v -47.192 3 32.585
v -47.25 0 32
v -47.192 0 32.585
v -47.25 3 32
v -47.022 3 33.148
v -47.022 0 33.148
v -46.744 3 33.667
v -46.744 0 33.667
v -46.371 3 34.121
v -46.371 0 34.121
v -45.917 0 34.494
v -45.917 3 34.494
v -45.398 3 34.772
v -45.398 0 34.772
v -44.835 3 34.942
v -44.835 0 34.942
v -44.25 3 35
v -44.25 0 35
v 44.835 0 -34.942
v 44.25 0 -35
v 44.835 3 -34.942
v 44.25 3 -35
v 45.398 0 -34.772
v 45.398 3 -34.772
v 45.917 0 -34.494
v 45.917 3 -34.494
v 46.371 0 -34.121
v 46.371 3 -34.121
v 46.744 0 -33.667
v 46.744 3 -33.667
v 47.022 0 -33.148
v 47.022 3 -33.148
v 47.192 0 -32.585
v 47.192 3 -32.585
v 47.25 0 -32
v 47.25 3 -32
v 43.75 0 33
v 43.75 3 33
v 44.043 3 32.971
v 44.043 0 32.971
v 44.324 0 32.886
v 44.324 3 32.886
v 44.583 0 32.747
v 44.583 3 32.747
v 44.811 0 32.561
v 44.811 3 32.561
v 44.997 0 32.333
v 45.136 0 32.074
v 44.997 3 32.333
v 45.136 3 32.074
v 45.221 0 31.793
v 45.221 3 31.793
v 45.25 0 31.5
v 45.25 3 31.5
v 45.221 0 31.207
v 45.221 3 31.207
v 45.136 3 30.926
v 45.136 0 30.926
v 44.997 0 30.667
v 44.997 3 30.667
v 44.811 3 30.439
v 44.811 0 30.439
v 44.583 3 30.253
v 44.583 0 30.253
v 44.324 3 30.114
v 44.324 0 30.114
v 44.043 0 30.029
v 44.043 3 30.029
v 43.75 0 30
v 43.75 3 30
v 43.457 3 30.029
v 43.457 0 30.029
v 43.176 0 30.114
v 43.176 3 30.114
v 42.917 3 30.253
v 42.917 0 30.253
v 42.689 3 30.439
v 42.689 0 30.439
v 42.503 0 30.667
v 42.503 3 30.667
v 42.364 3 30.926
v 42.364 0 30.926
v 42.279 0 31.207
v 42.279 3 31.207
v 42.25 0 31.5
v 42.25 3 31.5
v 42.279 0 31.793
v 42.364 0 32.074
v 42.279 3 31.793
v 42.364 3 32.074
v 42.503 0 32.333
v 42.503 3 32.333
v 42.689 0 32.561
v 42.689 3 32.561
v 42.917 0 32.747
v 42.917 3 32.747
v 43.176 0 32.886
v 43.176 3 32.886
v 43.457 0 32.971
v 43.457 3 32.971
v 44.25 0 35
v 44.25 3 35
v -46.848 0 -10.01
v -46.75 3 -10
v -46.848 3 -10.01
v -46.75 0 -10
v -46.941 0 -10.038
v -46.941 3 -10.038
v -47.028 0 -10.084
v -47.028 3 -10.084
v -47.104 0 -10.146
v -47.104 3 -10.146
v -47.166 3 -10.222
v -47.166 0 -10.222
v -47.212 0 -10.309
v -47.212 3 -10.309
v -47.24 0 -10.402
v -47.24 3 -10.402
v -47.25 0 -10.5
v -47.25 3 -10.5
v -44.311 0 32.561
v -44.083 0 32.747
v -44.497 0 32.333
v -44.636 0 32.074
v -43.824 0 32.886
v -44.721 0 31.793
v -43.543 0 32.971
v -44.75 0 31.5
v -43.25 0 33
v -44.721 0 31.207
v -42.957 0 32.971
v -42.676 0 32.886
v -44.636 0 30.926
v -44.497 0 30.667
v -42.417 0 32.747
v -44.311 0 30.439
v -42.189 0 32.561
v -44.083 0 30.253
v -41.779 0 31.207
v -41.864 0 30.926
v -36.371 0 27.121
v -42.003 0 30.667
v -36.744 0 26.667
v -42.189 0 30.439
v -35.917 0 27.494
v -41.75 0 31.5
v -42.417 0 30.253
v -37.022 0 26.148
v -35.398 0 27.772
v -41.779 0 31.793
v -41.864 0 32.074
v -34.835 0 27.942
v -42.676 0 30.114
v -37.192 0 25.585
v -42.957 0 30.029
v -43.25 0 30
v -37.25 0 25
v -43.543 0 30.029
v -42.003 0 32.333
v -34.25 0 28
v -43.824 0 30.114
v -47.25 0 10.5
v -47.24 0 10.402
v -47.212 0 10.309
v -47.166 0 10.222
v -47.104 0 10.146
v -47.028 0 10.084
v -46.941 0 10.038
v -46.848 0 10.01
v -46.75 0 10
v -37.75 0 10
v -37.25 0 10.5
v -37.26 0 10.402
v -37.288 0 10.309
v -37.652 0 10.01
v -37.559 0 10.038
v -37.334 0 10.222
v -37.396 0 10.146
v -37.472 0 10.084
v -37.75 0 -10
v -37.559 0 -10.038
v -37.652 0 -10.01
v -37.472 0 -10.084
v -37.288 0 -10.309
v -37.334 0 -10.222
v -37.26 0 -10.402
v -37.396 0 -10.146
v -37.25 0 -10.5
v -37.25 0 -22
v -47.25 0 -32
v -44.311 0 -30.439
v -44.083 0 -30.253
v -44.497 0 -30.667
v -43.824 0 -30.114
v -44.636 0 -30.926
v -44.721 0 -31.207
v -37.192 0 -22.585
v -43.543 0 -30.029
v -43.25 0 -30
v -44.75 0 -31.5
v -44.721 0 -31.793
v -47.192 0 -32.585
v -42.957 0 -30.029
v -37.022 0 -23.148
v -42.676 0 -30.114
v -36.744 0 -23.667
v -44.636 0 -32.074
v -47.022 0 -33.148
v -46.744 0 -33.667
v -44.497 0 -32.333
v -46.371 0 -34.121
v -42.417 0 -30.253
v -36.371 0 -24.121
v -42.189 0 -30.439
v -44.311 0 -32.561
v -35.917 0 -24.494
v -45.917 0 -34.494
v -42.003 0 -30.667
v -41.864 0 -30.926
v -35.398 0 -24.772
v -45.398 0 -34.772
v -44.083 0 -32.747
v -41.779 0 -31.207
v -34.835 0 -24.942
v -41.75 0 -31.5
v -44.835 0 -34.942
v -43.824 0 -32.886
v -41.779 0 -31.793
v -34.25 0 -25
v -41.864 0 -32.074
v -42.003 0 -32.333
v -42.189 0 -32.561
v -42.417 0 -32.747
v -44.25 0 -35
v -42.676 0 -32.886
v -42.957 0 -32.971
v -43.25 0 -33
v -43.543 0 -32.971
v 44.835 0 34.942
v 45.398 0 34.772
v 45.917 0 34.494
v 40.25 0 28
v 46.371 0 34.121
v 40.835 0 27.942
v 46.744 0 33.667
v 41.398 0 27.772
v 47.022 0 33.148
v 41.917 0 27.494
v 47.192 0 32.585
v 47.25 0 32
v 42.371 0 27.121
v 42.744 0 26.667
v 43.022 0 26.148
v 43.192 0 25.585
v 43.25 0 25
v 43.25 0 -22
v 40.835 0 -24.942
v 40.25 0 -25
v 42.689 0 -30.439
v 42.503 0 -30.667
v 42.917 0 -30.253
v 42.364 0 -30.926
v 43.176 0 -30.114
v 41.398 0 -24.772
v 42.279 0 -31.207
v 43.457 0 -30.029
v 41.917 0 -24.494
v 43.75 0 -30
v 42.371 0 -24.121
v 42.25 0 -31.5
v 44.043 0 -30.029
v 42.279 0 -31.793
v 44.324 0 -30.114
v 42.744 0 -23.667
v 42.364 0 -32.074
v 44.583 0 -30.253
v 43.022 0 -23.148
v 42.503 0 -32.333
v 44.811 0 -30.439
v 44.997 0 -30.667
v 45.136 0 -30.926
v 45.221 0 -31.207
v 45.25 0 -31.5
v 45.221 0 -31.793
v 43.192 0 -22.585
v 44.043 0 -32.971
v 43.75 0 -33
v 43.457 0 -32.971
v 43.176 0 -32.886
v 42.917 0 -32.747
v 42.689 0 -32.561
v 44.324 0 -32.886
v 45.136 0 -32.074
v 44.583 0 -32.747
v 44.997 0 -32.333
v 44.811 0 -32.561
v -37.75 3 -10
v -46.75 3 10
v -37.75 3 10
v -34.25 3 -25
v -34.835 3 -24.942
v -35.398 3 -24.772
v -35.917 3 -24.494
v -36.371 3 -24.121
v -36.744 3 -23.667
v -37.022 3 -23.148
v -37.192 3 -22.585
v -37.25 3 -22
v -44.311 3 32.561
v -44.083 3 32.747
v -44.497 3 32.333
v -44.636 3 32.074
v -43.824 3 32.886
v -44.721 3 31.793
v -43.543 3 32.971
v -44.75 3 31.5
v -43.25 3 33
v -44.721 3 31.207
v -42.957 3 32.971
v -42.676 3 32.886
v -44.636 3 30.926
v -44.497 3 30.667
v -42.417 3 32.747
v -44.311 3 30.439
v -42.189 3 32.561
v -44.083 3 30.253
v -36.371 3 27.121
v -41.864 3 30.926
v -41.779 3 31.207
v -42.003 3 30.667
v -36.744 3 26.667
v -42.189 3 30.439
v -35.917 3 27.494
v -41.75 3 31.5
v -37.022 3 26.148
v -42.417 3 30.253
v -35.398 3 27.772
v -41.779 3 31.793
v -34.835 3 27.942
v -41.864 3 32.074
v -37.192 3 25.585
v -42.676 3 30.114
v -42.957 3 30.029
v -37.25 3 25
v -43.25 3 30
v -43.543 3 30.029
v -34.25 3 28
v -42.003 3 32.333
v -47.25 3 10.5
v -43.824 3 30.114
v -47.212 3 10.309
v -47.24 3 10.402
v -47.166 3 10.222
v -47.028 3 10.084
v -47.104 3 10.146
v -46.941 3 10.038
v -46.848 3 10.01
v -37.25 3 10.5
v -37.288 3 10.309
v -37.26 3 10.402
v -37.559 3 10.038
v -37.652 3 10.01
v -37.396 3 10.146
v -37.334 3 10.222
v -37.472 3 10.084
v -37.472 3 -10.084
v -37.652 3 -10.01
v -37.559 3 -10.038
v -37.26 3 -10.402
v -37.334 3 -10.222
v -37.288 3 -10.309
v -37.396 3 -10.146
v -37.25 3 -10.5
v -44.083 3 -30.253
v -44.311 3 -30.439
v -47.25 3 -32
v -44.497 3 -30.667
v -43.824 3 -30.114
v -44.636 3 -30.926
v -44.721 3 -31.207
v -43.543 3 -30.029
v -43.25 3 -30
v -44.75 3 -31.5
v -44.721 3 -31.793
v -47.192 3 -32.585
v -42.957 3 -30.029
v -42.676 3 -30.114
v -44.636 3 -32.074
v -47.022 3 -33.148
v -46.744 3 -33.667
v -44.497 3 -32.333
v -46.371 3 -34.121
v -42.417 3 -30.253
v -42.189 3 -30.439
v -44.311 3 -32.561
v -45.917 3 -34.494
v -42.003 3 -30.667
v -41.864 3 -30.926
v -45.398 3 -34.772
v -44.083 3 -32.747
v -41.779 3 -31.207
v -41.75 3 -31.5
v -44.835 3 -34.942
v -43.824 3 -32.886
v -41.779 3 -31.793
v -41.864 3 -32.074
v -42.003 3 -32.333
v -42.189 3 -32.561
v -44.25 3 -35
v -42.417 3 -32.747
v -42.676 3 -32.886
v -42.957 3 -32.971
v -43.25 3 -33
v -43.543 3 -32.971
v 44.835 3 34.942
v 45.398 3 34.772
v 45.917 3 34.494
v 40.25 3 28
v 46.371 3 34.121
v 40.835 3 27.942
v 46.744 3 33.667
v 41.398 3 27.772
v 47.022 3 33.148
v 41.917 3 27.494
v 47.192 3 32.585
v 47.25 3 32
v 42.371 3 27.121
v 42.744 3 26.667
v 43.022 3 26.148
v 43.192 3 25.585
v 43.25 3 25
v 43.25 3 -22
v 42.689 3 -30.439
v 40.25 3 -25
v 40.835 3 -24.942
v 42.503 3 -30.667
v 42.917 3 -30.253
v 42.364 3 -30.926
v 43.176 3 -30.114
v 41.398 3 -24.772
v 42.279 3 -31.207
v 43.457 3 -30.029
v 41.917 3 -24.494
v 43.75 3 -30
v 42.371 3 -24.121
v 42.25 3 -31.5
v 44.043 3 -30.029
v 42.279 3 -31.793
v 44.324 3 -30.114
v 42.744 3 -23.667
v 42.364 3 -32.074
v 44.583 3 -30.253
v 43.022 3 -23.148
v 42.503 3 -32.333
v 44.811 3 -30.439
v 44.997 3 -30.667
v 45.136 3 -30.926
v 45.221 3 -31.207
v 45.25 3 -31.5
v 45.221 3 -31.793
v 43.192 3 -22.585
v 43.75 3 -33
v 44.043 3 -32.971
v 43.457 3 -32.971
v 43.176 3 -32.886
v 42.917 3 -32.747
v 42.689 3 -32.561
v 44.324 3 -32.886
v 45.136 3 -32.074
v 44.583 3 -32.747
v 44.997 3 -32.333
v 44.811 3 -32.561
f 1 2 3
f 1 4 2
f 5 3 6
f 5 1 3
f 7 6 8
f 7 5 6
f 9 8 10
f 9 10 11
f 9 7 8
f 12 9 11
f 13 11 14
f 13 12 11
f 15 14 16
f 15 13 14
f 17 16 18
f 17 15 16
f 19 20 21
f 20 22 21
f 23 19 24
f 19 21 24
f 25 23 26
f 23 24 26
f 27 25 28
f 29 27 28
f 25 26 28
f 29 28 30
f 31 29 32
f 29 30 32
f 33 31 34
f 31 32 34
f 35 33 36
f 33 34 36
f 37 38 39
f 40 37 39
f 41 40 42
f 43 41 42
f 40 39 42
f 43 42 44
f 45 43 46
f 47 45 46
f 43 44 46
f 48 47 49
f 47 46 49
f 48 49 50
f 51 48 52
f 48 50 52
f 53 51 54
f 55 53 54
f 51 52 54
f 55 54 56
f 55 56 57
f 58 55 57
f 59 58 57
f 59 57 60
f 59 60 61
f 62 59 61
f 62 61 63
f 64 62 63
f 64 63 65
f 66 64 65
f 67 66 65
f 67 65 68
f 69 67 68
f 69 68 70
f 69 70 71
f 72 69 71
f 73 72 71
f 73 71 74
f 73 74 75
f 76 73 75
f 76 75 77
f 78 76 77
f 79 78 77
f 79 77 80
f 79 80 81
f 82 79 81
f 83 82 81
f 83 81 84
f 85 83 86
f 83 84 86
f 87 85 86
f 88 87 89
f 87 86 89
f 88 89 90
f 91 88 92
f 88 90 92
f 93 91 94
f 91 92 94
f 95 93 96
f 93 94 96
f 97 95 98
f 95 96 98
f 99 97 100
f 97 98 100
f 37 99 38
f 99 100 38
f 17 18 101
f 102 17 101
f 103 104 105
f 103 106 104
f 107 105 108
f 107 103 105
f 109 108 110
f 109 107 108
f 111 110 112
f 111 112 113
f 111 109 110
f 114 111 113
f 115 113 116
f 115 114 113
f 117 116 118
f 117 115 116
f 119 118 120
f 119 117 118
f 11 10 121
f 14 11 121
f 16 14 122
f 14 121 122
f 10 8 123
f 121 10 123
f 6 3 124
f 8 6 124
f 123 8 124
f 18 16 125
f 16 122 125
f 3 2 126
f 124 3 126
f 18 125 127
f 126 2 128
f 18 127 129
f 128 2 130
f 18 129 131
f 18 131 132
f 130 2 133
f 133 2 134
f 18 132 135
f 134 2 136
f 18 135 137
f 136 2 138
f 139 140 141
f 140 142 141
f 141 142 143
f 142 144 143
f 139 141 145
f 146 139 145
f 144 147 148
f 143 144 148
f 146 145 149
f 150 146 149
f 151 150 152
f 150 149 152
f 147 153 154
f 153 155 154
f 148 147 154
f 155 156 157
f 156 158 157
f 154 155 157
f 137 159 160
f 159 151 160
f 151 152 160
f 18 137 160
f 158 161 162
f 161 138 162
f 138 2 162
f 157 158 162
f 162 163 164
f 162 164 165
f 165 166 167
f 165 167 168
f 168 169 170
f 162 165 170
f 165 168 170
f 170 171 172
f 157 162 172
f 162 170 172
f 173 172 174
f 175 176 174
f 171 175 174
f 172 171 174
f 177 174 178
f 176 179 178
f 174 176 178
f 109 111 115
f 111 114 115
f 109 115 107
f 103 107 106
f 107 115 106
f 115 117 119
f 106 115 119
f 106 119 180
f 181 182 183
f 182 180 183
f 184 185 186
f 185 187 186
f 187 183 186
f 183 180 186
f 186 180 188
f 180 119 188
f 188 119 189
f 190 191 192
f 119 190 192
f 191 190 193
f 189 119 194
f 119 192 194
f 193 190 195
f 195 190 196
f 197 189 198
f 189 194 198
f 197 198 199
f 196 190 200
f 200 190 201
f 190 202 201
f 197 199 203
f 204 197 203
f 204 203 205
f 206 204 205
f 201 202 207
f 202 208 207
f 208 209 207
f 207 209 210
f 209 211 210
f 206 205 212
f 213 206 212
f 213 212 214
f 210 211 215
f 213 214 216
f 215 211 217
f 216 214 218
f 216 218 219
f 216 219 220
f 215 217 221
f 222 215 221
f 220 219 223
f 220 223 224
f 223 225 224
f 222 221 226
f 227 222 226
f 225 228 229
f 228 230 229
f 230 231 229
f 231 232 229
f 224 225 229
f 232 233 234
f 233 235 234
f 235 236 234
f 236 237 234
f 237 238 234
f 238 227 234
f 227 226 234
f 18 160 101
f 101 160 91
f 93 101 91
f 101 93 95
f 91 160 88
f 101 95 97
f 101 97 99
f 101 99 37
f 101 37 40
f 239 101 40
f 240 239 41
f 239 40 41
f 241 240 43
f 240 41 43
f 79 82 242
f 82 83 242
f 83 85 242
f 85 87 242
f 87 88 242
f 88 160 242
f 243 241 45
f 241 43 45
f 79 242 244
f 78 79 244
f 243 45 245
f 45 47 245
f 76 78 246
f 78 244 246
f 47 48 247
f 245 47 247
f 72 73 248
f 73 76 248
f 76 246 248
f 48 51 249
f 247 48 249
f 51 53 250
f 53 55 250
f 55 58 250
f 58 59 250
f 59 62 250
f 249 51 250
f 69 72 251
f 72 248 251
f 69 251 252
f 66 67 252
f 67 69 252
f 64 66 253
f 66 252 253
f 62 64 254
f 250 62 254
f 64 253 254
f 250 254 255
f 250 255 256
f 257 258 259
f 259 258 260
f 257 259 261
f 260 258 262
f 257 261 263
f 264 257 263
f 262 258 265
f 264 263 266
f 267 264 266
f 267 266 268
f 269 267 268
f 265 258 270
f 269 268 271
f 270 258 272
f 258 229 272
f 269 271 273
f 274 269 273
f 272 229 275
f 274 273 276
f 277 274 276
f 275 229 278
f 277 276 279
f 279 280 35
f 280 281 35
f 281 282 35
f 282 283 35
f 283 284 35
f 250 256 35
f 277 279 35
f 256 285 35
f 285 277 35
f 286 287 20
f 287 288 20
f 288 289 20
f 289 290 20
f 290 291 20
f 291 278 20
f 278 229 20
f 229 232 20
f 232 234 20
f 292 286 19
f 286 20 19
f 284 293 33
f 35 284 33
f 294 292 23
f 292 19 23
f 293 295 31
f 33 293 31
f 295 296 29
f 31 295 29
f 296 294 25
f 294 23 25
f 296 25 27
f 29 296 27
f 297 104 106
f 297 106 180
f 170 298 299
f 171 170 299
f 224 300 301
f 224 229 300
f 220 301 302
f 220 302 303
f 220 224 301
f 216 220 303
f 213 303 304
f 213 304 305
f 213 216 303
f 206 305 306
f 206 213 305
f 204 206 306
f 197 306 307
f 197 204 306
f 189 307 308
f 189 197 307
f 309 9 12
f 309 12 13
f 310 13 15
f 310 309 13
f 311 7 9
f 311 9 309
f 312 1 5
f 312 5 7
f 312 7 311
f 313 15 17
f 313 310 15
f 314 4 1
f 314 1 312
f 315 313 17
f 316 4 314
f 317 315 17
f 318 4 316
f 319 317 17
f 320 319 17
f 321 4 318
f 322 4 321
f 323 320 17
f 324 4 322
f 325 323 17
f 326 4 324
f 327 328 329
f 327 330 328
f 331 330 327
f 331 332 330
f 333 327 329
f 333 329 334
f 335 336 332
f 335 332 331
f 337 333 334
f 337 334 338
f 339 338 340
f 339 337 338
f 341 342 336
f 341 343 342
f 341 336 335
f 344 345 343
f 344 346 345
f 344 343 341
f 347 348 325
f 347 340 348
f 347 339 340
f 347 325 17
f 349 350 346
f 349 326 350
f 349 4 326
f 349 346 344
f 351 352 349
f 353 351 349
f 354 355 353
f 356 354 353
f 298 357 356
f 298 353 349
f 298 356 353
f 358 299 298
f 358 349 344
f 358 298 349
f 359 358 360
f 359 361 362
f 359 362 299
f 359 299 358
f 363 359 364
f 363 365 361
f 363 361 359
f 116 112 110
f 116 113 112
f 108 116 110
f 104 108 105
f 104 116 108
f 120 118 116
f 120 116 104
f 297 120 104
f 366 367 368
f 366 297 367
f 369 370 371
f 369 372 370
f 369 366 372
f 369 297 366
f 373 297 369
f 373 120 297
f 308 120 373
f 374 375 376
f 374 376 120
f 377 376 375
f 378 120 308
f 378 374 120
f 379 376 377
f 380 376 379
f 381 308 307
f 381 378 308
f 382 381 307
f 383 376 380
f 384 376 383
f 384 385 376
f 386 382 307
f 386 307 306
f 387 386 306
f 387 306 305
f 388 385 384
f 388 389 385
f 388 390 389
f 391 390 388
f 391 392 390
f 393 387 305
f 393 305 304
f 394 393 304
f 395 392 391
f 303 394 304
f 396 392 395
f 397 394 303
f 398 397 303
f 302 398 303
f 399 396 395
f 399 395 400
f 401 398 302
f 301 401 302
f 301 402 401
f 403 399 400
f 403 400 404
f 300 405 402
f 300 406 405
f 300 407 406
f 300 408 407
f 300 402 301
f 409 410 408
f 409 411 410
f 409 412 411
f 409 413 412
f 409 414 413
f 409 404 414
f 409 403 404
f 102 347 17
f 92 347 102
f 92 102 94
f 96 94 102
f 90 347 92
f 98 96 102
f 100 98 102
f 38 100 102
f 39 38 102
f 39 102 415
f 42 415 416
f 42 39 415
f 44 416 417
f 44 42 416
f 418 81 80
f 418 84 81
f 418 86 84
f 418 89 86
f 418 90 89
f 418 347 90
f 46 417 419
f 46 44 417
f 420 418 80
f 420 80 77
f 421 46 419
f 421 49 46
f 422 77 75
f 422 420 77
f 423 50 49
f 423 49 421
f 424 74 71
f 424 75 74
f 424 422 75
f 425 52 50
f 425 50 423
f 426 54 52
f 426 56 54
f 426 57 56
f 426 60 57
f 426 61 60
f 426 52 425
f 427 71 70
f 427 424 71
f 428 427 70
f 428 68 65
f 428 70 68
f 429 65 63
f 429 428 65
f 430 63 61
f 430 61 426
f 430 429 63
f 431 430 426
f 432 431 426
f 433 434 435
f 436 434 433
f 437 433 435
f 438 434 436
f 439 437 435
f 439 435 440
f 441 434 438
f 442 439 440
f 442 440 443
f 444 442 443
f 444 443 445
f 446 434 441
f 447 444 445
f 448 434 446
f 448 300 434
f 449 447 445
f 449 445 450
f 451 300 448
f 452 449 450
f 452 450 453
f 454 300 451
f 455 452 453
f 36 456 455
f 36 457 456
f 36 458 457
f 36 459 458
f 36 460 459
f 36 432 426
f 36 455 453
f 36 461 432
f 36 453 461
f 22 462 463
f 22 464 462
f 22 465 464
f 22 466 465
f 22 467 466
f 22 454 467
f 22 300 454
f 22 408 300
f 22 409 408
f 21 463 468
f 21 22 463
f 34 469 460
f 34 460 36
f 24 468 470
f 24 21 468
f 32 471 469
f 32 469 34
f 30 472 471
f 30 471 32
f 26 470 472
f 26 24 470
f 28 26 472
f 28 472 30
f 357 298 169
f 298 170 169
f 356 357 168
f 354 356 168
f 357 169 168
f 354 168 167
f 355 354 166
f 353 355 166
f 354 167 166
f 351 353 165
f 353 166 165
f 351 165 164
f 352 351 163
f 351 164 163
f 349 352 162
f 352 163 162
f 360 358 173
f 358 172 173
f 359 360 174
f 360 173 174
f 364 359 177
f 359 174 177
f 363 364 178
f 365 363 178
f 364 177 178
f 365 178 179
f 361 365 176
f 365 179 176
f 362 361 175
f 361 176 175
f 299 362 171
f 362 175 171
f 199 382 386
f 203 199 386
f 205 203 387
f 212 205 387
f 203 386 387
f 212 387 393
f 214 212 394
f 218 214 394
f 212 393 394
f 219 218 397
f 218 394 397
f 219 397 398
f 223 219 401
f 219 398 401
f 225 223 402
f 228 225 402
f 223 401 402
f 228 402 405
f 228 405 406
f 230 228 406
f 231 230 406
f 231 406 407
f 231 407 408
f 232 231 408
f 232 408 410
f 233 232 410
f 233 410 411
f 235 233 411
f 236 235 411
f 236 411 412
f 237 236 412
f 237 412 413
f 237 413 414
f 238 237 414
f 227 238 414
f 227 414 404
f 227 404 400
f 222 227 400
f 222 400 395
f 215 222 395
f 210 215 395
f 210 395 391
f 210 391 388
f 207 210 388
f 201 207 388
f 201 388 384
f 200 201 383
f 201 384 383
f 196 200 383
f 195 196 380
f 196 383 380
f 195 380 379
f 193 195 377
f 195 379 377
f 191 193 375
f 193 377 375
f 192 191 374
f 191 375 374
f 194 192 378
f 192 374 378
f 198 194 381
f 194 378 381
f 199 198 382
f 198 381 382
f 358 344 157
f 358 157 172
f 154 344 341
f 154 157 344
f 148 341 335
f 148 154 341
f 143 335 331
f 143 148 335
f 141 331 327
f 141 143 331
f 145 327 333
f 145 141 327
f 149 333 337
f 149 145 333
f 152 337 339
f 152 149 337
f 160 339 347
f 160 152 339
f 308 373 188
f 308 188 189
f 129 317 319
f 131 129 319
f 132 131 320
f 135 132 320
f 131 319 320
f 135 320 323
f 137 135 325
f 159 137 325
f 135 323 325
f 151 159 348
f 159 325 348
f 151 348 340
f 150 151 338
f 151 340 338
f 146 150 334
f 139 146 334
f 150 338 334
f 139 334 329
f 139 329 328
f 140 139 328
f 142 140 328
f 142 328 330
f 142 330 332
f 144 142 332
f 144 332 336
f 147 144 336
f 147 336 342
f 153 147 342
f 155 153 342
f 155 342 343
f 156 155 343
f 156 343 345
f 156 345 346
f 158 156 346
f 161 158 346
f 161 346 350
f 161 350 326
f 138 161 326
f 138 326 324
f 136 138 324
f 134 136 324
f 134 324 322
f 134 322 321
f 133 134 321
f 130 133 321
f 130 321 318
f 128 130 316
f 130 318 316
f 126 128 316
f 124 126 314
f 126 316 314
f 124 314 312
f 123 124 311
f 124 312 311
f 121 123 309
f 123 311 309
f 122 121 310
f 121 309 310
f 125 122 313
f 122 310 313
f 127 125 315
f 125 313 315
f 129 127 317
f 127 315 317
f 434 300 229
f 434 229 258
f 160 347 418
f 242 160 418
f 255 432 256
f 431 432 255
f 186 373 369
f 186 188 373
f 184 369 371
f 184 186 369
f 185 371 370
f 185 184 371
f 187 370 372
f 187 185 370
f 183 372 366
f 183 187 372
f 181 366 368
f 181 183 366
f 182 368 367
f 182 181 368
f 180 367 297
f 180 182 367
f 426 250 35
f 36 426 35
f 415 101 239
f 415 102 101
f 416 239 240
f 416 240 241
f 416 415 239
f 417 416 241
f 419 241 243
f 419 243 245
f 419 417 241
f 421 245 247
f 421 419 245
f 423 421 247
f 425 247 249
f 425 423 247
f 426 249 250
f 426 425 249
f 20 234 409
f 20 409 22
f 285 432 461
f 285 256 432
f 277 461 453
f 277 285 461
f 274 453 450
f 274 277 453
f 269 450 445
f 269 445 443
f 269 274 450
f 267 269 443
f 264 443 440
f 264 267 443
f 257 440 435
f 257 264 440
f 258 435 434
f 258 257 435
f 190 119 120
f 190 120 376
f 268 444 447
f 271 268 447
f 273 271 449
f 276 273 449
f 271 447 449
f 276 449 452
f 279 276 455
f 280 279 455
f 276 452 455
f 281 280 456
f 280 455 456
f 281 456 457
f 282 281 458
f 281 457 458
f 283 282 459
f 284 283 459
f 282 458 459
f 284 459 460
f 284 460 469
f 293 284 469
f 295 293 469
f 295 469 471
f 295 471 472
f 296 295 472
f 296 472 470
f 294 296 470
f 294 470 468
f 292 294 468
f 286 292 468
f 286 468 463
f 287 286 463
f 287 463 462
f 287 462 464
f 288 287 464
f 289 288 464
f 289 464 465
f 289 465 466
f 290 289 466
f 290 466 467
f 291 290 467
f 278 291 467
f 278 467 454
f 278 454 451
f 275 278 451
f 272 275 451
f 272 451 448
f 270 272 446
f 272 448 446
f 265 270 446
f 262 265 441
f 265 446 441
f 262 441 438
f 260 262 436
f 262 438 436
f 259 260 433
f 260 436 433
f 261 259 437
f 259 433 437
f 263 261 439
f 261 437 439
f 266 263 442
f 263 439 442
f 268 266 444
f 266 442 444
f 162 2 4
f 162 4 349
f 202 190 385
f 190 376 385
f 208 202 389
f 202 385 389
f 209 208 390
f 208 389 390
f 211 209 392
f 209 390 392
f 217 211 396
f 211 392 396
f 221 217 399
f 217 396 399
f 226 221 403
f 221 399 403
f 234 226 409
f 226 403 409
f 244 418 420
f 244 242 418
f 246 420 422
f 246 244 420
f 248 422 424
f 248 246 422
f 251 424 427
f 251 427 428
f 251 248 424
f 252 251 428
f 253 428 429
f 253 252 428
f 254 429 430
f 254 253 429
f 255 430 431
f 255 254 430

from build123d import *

# Parameters (mm, degrees)
SKETCH1_W           = 94.5
SKETCH1_H           = 70
BOSS_EXTRUDE1_DEPTH = 3
SKETCH3_R           = 1.5
CUT_EXTRUDE2_DEPTH  = 59.877521177
FILLET2_R           = 3
SKETCH5_W           = 10
SKETCH5_H           = 20
CUT_EXTRUDE3_DEPTH  = 59.877521177
FILLET3_R           = 3
FILLET4_R           = 0.5


with BuildPart() as part:
    # Sketch1 → Boss-Extrude1 (new body)
    with BuildSketch(Plane(origin=(0, 0, 0), x_dir=(1, 0, 0), z_dir=(0, 1, 0))):
        Rectangle(SKETCH1_W, SKETCH1_H)
    extrude(amount=BOSS_EXTRUDE1_DEPTH)

    # Sketch3 → Cut-Extrude2 (cut, through all)
    with BuildSketch(Plane(origin=(0, 3, 0), x_dir=(1, 0, 0), z_dir=(0, 1, 0))):
        with Locations(Location((43.75, 31.5, 0), (0, 0, 270))):
            Circle(SKETCH3_R)
        with Locations(Location((-43.25, 31.5, 0), (0, 0, 270))):
            Circle(SKETCH3_R)
        with Locations(Location((-43.25, -31.5, 0), (0, 0, 270))):
            Circle(SKETCH3_R)
        with Locations(Location((43.75, -31.5, 0), (0, 0, 270))):
            Circle(SKETCH3_R)
    extrude(amount=-CUT_EXTRUDE2_DEPTH, mode=Mode.SUBTRACT)

    # Fillet2
    fillet2_edges = [part.edges().sort_by_distance(p)[0] for p in [
        (47.25, 1.5, 35),
        (-47.25, 1.5, 35),
        (-47.25, 1.5, -35),
        (47.25, 1.5, -35),
    ]]
    fillet(fillet2_edges, radius=FILLET2_R)

    # Sketch5 → Cut-Extrude3 (cut, through all)
    with BuildSketch(Plane(origin=(0, 3, 0), x_dir=(1, 0, 0), z_dir=(0, 1, 0))):
        Polygon((-30, -28), (-37.25, -28), (-37.25, 25), (43.25, 25), (43.25, -28), align=None)
        with Locations((-42.25, 0)):
            Rectangle(SKETCH5_W, SKETCH5_H)
    extrude(amount=-CUT_EXTRUDE3_DEPTH, mode=Mode.SUBTRACT)

    # Fillet3
    fillet3_edges = [part.edges().sort_by_distance(p)[0] for p in [
        (43.25, 1.5, 28),
        (-37.25, 1.5, 28),
        (-37.25, 1.5, -25),
        (43.25, 1.5, -25),
    ]]
    fillet(fillet3_edges, radius=FILLET3_R)

    # Fillet4
    fillet4_edges = [part.edges().sort_by_distance(p)[0] for p in [
        (-37.25, 1.5, 10),
        (-47.25, 1.5, 10),
        (-47.25, 1.5, -10),
        (-37.25, 1.5, -10),
    ]]
    fillet(fillet4_edges, radius=FILLET4_R)


solid = part.part
